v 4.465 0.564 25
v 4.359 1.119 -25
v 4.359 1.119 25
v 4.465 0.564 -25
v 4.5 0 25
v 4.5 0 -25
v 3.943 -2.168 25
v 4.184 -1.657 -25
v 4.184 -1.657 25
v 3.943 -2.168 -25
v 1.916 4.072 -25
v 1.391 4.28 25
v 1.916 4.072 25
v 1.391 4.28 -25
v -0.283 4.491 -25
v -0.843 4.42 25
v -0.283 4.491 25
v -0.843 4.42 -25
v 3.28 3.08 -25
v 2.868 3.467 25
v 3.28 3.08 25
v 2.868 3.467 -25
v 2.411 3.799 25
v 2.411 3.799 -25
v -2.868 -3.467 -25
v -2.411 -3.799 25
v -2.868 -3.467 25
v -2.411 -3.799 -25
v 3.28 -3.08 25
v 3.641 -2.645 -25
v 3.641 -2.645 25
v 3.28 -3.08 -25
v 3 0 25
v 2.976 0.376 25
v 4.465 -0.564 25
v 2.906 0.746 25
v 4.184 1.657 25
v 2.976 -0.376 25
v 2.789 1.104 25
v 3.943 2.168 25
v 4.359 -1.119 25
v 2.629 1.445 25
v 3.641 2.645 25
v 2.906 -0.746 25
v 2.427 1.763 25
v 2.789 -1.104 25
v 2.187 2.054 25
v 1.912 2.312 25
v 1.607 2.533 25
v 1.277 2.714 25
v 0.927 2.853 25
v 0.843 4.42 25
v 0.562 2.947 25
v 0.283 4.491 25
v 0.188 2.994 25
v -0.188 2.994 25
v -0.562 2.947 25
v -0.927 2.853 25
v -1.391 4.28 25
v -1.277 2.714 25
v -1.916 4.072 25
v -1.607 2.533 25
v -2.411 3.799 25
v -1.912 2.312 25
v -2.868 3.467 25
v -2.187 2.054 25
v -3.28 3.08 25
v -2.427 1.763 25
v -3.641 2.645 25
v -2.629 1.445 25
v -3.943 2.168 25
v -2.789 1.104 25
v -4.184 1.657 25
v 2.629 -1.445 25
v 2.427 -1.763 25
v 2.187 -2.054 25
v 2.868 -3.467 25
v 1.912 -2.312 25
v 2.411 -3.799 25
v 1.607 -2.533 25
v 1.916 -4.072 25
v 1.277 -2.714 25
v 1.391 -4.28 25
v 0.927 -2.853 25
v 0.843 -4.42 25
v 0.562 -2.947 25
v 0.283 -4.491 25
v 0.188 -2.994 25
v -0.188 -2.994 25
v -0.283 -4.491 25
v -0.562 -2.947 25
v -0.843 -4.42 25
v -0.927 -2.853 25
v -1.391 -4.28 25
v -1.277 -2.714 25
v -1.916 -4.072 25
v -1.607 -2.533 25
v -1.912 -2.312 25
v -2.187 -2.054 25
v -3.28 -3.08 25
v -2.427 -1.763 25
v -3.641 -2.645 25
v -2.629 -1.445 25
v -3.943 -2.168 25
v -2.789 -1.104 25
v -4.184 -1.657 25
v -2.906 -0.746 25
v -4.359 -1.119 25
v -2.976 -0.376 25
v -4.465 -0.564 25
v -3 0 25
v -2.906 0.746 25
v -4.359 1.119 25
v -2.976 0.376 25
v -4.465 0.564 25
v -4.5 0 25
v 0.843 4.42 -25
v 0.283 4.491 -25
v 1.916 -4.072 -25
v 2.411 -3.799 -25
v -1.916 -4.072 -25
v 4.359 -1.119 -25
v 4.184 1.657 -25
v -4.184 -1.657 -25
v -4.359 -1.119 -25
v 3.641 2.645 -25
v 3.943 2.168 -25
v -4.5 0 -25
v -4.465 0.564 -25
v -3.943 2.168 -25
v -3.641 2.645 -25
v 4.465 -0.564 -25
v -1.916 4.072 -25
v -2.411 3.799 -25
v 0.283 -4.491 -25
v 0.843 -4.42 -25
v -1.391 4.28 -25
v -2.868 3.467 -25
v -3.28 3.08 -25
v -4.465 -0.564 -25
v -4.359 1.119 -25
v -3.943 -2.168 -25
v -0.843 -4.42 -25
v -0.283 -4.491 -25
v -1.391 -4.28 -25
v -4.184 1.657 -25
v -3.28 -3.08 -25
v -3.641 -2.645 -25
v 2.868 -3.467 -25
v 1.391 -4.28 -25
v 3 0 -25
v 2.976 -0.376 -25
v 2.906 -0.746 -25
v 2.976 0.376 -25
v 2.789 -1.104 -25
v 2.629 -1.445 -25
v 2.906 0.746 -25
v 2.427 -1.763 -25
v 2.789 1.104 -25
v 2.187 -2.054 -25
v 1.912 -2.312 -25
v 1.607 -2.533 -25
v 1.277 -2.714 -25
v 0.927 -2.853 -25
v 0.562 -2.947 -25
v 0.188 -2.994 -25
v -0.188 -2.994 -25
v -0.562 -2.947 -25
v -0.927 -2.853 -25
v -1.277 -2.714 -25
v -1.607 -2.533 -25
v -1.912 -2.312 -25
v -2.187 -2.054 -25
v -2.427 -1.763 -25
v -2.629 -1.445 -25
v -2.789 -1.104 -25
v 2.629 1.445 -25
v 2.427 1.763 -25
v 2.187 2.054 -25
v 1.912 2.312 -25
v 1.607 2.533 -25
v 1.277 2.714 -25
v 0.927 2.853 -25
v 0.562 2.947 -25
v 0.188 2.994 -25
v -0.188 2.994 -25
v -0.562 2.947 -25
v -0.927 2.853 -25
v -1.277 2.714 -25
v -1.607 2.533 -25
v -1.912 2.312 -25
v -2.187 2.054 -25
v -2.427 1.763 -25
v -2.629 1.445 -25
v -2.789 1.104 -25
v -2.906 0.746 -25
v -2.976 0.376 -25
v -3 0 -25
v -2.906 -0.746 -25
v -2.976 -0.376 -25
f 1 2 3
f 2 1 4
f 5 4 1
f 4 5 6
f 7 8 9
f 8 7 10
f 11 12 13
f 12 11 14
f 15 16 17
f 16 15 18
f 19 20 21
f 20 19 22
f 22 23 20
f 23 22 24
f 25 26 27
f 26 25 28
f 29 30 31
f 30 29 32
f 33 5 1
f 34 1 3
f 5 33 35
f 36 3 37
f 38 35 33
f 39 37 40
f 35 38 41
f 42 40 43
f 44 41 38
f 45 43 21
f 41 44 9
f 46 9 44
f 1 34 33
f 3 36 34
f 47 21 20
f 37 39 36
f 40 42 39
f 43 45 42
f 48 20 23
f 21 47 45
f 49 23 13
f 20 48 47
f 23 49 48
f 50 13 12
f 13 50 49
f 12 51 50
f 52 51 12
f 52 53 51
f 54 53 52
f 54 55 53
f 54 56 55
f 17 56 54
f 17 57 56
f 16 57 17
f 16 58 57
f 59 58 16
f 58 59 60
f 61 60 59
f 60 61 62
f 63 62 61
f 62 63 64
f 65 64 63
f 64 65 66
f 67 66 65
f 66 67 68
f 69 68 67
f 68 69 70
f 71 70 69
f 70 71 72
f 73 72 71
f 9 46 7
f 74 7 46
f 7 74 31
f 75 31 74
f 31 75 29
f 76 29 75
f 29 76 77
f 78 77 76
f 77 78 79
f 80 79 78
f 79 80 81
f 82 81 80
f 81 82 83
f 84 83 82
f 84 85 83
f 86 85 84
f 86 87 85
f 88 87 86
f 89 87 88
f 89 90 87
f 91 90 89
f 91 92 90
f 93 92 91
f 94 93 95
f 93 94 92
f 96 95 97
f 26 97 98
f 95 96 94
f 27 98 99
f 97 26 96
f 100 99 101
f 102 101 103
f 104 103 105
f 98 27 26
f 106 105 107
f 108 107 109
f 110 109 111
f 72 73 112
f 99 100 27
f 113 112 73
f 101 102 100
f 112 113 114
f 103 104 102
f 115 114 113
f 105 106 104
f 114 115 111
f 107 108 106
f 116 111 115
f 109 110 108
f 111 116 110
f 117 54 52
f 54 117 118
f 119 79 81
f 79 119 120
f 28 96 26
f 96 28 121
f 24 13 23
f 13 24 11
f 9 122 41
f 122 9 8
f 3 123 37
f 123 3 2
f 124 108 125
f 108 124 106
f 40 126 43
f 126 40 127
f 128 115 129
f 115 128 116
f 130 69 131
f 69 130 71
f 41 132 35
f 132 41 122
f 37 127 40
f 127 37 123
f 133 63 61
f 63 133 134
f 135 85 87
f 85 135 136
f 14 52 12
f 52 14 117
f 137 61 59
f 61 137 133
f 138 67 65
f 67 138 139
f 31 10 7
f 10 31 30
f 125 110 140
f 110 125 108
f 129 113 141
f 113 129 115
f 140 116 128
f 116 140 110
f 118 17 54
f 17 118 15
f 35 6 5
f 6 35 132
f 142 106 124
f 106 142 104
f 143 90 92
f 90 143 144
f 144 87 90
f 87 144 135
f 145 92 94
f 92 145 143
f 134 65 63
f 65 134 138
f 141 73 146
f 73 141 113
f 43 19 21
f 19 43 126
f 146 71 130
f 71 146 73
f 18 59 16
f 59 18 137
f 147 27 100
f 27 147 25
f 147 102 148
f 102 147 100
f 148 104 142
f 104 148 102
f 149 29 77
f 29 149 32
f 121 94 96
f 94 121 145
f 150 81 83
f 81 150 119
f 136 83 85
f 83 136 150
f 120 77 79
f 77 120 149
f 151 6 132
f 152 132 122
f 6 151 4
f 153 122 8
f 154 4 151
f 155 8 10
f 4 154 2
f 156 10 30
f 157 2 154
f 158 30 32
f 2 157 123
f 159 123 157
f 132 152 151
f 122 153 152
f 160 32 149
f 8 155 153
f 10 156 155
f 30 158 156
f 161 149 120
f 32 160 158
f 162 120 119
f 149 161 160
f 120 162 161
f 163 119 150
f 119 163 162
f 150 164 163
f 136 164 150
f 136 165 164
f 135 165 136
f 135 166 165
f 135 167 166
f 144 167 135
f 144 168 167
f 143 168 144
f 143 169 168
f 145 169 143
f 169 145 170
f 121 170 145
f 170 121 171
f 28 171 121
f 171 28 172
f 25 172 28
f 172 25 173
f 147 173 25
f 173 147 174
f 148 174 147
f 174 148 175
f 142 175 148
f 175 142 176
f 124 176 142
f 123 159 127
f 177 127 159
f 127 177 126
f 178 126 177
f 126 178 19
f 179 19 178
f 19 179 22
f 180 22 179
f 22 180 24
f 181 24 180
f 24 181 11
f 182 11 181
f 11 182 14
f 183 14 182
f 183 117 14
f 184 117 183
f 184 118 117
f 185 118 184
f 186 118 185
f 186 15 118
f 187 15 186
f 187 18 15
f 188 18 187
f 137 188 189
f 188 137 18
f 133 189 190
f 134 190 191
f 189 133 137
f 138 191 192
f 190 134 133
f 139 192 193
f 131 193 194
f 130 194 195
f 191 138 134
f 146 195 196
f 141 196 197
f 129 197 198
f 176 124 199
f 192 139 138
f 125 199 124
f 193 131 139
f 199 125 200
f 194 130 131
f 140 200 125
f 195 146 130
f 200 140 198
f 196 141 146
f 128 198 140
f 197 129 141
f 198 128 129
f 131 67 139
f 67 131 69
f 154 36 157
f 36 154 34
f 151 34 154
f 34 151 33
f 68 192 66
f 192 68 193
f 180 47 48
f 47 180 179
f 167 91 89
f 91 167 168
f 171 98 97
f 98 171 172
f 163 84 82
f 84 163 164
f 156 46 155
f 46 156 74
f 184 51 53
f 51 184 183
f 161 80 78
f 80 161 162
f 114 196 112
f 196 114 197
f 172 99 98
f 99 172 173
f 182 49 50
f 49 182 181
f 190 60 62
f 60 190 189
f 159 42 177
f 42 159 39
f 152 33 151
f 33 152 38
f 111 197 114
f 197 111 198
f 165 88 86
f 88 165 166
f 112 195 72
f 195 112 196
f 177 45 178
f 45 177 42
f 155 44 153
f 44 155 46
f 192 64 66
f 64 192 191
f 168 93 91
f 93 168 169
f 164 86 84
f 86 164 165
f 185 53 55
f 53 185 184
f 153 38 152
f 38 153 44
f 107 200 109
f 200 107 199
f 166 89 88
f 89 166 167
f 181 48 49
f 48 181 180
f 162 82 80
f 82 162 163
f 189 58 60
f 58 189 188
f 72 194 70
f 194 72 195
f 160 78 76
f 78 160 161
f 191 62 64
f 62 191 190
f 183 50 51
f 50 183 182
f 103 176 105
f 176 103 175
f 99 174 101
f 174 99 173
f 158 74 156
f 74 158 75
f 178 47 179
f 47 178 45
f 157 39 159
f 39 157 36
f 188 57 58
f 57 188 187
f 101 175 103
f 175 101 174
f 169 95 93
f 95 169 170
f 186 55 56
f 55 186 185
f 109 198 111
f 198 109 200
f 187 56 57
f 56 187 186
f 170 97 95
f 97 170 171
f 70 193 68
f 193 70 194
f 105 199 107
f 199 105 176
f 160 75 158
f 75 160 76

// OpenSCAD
$fn = 50;


difference() {
	union() {
		translate(v = [0, 0, -25.0000000000]) {
			cylinder(h = 50, r = 4.5000000000);
		}
	}
	union() {
		translate(v = [0, 0, -100.0000000000]) {
			cylinder(h = 200, r = 3.0000000000);
		}
	}
}
